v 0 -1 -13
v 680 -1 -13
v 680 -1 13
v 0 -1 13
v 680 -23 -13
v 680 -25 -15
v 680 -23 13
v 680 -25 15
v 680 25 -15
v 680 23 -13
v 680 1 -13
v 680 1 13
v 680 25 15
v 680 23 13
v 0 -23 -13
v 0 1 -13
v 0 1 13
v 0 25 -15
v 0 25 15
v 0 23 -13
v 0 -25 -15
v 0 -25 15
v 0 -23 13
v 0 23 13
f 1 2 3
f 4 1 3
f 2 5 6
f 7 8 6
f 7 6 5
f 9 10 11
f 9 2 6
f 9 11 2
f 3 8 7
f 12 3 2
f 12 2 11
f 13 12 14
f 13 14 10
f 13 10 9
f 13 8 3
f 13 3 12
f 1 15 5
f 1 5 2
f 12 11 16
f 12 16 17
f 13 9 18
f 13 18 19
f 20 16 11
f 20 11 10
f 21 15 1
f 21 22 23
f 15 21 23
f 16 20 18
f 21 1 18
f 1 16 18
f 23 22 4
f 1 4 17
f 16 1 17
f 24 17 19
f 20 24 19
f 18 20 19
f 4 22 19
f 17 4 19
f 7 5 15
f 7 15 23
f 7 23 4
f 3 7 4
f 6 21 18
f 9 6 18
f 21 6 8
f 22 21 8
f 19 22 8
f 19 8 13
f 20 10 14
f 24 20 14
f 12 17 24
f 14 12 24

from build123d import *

# Parameters (mm, degrees)
F0_W     = 50
F0_H     = 30
F0_W_2   = 22
F0_H_2   = 26
F1_DEPTH = 680


with BuildPart() as f1:
    # F0 (on Right) → F1 (new body)
    with BuildSketch(Plane.YZ):
        Rectangle(F0_W, F0_H)
        with Locations((-12, 0)):
            Rectangle(F0_W_2, F0_H_2, mode=Mode.SUBTRACT)
        with Locations((12, 0)):
            Rectangle(F0_W_2, F0_H_2, mode=Mode.SUBTRACT)
    extrude(amount=F1_DEPTH)


solid = f1.part
